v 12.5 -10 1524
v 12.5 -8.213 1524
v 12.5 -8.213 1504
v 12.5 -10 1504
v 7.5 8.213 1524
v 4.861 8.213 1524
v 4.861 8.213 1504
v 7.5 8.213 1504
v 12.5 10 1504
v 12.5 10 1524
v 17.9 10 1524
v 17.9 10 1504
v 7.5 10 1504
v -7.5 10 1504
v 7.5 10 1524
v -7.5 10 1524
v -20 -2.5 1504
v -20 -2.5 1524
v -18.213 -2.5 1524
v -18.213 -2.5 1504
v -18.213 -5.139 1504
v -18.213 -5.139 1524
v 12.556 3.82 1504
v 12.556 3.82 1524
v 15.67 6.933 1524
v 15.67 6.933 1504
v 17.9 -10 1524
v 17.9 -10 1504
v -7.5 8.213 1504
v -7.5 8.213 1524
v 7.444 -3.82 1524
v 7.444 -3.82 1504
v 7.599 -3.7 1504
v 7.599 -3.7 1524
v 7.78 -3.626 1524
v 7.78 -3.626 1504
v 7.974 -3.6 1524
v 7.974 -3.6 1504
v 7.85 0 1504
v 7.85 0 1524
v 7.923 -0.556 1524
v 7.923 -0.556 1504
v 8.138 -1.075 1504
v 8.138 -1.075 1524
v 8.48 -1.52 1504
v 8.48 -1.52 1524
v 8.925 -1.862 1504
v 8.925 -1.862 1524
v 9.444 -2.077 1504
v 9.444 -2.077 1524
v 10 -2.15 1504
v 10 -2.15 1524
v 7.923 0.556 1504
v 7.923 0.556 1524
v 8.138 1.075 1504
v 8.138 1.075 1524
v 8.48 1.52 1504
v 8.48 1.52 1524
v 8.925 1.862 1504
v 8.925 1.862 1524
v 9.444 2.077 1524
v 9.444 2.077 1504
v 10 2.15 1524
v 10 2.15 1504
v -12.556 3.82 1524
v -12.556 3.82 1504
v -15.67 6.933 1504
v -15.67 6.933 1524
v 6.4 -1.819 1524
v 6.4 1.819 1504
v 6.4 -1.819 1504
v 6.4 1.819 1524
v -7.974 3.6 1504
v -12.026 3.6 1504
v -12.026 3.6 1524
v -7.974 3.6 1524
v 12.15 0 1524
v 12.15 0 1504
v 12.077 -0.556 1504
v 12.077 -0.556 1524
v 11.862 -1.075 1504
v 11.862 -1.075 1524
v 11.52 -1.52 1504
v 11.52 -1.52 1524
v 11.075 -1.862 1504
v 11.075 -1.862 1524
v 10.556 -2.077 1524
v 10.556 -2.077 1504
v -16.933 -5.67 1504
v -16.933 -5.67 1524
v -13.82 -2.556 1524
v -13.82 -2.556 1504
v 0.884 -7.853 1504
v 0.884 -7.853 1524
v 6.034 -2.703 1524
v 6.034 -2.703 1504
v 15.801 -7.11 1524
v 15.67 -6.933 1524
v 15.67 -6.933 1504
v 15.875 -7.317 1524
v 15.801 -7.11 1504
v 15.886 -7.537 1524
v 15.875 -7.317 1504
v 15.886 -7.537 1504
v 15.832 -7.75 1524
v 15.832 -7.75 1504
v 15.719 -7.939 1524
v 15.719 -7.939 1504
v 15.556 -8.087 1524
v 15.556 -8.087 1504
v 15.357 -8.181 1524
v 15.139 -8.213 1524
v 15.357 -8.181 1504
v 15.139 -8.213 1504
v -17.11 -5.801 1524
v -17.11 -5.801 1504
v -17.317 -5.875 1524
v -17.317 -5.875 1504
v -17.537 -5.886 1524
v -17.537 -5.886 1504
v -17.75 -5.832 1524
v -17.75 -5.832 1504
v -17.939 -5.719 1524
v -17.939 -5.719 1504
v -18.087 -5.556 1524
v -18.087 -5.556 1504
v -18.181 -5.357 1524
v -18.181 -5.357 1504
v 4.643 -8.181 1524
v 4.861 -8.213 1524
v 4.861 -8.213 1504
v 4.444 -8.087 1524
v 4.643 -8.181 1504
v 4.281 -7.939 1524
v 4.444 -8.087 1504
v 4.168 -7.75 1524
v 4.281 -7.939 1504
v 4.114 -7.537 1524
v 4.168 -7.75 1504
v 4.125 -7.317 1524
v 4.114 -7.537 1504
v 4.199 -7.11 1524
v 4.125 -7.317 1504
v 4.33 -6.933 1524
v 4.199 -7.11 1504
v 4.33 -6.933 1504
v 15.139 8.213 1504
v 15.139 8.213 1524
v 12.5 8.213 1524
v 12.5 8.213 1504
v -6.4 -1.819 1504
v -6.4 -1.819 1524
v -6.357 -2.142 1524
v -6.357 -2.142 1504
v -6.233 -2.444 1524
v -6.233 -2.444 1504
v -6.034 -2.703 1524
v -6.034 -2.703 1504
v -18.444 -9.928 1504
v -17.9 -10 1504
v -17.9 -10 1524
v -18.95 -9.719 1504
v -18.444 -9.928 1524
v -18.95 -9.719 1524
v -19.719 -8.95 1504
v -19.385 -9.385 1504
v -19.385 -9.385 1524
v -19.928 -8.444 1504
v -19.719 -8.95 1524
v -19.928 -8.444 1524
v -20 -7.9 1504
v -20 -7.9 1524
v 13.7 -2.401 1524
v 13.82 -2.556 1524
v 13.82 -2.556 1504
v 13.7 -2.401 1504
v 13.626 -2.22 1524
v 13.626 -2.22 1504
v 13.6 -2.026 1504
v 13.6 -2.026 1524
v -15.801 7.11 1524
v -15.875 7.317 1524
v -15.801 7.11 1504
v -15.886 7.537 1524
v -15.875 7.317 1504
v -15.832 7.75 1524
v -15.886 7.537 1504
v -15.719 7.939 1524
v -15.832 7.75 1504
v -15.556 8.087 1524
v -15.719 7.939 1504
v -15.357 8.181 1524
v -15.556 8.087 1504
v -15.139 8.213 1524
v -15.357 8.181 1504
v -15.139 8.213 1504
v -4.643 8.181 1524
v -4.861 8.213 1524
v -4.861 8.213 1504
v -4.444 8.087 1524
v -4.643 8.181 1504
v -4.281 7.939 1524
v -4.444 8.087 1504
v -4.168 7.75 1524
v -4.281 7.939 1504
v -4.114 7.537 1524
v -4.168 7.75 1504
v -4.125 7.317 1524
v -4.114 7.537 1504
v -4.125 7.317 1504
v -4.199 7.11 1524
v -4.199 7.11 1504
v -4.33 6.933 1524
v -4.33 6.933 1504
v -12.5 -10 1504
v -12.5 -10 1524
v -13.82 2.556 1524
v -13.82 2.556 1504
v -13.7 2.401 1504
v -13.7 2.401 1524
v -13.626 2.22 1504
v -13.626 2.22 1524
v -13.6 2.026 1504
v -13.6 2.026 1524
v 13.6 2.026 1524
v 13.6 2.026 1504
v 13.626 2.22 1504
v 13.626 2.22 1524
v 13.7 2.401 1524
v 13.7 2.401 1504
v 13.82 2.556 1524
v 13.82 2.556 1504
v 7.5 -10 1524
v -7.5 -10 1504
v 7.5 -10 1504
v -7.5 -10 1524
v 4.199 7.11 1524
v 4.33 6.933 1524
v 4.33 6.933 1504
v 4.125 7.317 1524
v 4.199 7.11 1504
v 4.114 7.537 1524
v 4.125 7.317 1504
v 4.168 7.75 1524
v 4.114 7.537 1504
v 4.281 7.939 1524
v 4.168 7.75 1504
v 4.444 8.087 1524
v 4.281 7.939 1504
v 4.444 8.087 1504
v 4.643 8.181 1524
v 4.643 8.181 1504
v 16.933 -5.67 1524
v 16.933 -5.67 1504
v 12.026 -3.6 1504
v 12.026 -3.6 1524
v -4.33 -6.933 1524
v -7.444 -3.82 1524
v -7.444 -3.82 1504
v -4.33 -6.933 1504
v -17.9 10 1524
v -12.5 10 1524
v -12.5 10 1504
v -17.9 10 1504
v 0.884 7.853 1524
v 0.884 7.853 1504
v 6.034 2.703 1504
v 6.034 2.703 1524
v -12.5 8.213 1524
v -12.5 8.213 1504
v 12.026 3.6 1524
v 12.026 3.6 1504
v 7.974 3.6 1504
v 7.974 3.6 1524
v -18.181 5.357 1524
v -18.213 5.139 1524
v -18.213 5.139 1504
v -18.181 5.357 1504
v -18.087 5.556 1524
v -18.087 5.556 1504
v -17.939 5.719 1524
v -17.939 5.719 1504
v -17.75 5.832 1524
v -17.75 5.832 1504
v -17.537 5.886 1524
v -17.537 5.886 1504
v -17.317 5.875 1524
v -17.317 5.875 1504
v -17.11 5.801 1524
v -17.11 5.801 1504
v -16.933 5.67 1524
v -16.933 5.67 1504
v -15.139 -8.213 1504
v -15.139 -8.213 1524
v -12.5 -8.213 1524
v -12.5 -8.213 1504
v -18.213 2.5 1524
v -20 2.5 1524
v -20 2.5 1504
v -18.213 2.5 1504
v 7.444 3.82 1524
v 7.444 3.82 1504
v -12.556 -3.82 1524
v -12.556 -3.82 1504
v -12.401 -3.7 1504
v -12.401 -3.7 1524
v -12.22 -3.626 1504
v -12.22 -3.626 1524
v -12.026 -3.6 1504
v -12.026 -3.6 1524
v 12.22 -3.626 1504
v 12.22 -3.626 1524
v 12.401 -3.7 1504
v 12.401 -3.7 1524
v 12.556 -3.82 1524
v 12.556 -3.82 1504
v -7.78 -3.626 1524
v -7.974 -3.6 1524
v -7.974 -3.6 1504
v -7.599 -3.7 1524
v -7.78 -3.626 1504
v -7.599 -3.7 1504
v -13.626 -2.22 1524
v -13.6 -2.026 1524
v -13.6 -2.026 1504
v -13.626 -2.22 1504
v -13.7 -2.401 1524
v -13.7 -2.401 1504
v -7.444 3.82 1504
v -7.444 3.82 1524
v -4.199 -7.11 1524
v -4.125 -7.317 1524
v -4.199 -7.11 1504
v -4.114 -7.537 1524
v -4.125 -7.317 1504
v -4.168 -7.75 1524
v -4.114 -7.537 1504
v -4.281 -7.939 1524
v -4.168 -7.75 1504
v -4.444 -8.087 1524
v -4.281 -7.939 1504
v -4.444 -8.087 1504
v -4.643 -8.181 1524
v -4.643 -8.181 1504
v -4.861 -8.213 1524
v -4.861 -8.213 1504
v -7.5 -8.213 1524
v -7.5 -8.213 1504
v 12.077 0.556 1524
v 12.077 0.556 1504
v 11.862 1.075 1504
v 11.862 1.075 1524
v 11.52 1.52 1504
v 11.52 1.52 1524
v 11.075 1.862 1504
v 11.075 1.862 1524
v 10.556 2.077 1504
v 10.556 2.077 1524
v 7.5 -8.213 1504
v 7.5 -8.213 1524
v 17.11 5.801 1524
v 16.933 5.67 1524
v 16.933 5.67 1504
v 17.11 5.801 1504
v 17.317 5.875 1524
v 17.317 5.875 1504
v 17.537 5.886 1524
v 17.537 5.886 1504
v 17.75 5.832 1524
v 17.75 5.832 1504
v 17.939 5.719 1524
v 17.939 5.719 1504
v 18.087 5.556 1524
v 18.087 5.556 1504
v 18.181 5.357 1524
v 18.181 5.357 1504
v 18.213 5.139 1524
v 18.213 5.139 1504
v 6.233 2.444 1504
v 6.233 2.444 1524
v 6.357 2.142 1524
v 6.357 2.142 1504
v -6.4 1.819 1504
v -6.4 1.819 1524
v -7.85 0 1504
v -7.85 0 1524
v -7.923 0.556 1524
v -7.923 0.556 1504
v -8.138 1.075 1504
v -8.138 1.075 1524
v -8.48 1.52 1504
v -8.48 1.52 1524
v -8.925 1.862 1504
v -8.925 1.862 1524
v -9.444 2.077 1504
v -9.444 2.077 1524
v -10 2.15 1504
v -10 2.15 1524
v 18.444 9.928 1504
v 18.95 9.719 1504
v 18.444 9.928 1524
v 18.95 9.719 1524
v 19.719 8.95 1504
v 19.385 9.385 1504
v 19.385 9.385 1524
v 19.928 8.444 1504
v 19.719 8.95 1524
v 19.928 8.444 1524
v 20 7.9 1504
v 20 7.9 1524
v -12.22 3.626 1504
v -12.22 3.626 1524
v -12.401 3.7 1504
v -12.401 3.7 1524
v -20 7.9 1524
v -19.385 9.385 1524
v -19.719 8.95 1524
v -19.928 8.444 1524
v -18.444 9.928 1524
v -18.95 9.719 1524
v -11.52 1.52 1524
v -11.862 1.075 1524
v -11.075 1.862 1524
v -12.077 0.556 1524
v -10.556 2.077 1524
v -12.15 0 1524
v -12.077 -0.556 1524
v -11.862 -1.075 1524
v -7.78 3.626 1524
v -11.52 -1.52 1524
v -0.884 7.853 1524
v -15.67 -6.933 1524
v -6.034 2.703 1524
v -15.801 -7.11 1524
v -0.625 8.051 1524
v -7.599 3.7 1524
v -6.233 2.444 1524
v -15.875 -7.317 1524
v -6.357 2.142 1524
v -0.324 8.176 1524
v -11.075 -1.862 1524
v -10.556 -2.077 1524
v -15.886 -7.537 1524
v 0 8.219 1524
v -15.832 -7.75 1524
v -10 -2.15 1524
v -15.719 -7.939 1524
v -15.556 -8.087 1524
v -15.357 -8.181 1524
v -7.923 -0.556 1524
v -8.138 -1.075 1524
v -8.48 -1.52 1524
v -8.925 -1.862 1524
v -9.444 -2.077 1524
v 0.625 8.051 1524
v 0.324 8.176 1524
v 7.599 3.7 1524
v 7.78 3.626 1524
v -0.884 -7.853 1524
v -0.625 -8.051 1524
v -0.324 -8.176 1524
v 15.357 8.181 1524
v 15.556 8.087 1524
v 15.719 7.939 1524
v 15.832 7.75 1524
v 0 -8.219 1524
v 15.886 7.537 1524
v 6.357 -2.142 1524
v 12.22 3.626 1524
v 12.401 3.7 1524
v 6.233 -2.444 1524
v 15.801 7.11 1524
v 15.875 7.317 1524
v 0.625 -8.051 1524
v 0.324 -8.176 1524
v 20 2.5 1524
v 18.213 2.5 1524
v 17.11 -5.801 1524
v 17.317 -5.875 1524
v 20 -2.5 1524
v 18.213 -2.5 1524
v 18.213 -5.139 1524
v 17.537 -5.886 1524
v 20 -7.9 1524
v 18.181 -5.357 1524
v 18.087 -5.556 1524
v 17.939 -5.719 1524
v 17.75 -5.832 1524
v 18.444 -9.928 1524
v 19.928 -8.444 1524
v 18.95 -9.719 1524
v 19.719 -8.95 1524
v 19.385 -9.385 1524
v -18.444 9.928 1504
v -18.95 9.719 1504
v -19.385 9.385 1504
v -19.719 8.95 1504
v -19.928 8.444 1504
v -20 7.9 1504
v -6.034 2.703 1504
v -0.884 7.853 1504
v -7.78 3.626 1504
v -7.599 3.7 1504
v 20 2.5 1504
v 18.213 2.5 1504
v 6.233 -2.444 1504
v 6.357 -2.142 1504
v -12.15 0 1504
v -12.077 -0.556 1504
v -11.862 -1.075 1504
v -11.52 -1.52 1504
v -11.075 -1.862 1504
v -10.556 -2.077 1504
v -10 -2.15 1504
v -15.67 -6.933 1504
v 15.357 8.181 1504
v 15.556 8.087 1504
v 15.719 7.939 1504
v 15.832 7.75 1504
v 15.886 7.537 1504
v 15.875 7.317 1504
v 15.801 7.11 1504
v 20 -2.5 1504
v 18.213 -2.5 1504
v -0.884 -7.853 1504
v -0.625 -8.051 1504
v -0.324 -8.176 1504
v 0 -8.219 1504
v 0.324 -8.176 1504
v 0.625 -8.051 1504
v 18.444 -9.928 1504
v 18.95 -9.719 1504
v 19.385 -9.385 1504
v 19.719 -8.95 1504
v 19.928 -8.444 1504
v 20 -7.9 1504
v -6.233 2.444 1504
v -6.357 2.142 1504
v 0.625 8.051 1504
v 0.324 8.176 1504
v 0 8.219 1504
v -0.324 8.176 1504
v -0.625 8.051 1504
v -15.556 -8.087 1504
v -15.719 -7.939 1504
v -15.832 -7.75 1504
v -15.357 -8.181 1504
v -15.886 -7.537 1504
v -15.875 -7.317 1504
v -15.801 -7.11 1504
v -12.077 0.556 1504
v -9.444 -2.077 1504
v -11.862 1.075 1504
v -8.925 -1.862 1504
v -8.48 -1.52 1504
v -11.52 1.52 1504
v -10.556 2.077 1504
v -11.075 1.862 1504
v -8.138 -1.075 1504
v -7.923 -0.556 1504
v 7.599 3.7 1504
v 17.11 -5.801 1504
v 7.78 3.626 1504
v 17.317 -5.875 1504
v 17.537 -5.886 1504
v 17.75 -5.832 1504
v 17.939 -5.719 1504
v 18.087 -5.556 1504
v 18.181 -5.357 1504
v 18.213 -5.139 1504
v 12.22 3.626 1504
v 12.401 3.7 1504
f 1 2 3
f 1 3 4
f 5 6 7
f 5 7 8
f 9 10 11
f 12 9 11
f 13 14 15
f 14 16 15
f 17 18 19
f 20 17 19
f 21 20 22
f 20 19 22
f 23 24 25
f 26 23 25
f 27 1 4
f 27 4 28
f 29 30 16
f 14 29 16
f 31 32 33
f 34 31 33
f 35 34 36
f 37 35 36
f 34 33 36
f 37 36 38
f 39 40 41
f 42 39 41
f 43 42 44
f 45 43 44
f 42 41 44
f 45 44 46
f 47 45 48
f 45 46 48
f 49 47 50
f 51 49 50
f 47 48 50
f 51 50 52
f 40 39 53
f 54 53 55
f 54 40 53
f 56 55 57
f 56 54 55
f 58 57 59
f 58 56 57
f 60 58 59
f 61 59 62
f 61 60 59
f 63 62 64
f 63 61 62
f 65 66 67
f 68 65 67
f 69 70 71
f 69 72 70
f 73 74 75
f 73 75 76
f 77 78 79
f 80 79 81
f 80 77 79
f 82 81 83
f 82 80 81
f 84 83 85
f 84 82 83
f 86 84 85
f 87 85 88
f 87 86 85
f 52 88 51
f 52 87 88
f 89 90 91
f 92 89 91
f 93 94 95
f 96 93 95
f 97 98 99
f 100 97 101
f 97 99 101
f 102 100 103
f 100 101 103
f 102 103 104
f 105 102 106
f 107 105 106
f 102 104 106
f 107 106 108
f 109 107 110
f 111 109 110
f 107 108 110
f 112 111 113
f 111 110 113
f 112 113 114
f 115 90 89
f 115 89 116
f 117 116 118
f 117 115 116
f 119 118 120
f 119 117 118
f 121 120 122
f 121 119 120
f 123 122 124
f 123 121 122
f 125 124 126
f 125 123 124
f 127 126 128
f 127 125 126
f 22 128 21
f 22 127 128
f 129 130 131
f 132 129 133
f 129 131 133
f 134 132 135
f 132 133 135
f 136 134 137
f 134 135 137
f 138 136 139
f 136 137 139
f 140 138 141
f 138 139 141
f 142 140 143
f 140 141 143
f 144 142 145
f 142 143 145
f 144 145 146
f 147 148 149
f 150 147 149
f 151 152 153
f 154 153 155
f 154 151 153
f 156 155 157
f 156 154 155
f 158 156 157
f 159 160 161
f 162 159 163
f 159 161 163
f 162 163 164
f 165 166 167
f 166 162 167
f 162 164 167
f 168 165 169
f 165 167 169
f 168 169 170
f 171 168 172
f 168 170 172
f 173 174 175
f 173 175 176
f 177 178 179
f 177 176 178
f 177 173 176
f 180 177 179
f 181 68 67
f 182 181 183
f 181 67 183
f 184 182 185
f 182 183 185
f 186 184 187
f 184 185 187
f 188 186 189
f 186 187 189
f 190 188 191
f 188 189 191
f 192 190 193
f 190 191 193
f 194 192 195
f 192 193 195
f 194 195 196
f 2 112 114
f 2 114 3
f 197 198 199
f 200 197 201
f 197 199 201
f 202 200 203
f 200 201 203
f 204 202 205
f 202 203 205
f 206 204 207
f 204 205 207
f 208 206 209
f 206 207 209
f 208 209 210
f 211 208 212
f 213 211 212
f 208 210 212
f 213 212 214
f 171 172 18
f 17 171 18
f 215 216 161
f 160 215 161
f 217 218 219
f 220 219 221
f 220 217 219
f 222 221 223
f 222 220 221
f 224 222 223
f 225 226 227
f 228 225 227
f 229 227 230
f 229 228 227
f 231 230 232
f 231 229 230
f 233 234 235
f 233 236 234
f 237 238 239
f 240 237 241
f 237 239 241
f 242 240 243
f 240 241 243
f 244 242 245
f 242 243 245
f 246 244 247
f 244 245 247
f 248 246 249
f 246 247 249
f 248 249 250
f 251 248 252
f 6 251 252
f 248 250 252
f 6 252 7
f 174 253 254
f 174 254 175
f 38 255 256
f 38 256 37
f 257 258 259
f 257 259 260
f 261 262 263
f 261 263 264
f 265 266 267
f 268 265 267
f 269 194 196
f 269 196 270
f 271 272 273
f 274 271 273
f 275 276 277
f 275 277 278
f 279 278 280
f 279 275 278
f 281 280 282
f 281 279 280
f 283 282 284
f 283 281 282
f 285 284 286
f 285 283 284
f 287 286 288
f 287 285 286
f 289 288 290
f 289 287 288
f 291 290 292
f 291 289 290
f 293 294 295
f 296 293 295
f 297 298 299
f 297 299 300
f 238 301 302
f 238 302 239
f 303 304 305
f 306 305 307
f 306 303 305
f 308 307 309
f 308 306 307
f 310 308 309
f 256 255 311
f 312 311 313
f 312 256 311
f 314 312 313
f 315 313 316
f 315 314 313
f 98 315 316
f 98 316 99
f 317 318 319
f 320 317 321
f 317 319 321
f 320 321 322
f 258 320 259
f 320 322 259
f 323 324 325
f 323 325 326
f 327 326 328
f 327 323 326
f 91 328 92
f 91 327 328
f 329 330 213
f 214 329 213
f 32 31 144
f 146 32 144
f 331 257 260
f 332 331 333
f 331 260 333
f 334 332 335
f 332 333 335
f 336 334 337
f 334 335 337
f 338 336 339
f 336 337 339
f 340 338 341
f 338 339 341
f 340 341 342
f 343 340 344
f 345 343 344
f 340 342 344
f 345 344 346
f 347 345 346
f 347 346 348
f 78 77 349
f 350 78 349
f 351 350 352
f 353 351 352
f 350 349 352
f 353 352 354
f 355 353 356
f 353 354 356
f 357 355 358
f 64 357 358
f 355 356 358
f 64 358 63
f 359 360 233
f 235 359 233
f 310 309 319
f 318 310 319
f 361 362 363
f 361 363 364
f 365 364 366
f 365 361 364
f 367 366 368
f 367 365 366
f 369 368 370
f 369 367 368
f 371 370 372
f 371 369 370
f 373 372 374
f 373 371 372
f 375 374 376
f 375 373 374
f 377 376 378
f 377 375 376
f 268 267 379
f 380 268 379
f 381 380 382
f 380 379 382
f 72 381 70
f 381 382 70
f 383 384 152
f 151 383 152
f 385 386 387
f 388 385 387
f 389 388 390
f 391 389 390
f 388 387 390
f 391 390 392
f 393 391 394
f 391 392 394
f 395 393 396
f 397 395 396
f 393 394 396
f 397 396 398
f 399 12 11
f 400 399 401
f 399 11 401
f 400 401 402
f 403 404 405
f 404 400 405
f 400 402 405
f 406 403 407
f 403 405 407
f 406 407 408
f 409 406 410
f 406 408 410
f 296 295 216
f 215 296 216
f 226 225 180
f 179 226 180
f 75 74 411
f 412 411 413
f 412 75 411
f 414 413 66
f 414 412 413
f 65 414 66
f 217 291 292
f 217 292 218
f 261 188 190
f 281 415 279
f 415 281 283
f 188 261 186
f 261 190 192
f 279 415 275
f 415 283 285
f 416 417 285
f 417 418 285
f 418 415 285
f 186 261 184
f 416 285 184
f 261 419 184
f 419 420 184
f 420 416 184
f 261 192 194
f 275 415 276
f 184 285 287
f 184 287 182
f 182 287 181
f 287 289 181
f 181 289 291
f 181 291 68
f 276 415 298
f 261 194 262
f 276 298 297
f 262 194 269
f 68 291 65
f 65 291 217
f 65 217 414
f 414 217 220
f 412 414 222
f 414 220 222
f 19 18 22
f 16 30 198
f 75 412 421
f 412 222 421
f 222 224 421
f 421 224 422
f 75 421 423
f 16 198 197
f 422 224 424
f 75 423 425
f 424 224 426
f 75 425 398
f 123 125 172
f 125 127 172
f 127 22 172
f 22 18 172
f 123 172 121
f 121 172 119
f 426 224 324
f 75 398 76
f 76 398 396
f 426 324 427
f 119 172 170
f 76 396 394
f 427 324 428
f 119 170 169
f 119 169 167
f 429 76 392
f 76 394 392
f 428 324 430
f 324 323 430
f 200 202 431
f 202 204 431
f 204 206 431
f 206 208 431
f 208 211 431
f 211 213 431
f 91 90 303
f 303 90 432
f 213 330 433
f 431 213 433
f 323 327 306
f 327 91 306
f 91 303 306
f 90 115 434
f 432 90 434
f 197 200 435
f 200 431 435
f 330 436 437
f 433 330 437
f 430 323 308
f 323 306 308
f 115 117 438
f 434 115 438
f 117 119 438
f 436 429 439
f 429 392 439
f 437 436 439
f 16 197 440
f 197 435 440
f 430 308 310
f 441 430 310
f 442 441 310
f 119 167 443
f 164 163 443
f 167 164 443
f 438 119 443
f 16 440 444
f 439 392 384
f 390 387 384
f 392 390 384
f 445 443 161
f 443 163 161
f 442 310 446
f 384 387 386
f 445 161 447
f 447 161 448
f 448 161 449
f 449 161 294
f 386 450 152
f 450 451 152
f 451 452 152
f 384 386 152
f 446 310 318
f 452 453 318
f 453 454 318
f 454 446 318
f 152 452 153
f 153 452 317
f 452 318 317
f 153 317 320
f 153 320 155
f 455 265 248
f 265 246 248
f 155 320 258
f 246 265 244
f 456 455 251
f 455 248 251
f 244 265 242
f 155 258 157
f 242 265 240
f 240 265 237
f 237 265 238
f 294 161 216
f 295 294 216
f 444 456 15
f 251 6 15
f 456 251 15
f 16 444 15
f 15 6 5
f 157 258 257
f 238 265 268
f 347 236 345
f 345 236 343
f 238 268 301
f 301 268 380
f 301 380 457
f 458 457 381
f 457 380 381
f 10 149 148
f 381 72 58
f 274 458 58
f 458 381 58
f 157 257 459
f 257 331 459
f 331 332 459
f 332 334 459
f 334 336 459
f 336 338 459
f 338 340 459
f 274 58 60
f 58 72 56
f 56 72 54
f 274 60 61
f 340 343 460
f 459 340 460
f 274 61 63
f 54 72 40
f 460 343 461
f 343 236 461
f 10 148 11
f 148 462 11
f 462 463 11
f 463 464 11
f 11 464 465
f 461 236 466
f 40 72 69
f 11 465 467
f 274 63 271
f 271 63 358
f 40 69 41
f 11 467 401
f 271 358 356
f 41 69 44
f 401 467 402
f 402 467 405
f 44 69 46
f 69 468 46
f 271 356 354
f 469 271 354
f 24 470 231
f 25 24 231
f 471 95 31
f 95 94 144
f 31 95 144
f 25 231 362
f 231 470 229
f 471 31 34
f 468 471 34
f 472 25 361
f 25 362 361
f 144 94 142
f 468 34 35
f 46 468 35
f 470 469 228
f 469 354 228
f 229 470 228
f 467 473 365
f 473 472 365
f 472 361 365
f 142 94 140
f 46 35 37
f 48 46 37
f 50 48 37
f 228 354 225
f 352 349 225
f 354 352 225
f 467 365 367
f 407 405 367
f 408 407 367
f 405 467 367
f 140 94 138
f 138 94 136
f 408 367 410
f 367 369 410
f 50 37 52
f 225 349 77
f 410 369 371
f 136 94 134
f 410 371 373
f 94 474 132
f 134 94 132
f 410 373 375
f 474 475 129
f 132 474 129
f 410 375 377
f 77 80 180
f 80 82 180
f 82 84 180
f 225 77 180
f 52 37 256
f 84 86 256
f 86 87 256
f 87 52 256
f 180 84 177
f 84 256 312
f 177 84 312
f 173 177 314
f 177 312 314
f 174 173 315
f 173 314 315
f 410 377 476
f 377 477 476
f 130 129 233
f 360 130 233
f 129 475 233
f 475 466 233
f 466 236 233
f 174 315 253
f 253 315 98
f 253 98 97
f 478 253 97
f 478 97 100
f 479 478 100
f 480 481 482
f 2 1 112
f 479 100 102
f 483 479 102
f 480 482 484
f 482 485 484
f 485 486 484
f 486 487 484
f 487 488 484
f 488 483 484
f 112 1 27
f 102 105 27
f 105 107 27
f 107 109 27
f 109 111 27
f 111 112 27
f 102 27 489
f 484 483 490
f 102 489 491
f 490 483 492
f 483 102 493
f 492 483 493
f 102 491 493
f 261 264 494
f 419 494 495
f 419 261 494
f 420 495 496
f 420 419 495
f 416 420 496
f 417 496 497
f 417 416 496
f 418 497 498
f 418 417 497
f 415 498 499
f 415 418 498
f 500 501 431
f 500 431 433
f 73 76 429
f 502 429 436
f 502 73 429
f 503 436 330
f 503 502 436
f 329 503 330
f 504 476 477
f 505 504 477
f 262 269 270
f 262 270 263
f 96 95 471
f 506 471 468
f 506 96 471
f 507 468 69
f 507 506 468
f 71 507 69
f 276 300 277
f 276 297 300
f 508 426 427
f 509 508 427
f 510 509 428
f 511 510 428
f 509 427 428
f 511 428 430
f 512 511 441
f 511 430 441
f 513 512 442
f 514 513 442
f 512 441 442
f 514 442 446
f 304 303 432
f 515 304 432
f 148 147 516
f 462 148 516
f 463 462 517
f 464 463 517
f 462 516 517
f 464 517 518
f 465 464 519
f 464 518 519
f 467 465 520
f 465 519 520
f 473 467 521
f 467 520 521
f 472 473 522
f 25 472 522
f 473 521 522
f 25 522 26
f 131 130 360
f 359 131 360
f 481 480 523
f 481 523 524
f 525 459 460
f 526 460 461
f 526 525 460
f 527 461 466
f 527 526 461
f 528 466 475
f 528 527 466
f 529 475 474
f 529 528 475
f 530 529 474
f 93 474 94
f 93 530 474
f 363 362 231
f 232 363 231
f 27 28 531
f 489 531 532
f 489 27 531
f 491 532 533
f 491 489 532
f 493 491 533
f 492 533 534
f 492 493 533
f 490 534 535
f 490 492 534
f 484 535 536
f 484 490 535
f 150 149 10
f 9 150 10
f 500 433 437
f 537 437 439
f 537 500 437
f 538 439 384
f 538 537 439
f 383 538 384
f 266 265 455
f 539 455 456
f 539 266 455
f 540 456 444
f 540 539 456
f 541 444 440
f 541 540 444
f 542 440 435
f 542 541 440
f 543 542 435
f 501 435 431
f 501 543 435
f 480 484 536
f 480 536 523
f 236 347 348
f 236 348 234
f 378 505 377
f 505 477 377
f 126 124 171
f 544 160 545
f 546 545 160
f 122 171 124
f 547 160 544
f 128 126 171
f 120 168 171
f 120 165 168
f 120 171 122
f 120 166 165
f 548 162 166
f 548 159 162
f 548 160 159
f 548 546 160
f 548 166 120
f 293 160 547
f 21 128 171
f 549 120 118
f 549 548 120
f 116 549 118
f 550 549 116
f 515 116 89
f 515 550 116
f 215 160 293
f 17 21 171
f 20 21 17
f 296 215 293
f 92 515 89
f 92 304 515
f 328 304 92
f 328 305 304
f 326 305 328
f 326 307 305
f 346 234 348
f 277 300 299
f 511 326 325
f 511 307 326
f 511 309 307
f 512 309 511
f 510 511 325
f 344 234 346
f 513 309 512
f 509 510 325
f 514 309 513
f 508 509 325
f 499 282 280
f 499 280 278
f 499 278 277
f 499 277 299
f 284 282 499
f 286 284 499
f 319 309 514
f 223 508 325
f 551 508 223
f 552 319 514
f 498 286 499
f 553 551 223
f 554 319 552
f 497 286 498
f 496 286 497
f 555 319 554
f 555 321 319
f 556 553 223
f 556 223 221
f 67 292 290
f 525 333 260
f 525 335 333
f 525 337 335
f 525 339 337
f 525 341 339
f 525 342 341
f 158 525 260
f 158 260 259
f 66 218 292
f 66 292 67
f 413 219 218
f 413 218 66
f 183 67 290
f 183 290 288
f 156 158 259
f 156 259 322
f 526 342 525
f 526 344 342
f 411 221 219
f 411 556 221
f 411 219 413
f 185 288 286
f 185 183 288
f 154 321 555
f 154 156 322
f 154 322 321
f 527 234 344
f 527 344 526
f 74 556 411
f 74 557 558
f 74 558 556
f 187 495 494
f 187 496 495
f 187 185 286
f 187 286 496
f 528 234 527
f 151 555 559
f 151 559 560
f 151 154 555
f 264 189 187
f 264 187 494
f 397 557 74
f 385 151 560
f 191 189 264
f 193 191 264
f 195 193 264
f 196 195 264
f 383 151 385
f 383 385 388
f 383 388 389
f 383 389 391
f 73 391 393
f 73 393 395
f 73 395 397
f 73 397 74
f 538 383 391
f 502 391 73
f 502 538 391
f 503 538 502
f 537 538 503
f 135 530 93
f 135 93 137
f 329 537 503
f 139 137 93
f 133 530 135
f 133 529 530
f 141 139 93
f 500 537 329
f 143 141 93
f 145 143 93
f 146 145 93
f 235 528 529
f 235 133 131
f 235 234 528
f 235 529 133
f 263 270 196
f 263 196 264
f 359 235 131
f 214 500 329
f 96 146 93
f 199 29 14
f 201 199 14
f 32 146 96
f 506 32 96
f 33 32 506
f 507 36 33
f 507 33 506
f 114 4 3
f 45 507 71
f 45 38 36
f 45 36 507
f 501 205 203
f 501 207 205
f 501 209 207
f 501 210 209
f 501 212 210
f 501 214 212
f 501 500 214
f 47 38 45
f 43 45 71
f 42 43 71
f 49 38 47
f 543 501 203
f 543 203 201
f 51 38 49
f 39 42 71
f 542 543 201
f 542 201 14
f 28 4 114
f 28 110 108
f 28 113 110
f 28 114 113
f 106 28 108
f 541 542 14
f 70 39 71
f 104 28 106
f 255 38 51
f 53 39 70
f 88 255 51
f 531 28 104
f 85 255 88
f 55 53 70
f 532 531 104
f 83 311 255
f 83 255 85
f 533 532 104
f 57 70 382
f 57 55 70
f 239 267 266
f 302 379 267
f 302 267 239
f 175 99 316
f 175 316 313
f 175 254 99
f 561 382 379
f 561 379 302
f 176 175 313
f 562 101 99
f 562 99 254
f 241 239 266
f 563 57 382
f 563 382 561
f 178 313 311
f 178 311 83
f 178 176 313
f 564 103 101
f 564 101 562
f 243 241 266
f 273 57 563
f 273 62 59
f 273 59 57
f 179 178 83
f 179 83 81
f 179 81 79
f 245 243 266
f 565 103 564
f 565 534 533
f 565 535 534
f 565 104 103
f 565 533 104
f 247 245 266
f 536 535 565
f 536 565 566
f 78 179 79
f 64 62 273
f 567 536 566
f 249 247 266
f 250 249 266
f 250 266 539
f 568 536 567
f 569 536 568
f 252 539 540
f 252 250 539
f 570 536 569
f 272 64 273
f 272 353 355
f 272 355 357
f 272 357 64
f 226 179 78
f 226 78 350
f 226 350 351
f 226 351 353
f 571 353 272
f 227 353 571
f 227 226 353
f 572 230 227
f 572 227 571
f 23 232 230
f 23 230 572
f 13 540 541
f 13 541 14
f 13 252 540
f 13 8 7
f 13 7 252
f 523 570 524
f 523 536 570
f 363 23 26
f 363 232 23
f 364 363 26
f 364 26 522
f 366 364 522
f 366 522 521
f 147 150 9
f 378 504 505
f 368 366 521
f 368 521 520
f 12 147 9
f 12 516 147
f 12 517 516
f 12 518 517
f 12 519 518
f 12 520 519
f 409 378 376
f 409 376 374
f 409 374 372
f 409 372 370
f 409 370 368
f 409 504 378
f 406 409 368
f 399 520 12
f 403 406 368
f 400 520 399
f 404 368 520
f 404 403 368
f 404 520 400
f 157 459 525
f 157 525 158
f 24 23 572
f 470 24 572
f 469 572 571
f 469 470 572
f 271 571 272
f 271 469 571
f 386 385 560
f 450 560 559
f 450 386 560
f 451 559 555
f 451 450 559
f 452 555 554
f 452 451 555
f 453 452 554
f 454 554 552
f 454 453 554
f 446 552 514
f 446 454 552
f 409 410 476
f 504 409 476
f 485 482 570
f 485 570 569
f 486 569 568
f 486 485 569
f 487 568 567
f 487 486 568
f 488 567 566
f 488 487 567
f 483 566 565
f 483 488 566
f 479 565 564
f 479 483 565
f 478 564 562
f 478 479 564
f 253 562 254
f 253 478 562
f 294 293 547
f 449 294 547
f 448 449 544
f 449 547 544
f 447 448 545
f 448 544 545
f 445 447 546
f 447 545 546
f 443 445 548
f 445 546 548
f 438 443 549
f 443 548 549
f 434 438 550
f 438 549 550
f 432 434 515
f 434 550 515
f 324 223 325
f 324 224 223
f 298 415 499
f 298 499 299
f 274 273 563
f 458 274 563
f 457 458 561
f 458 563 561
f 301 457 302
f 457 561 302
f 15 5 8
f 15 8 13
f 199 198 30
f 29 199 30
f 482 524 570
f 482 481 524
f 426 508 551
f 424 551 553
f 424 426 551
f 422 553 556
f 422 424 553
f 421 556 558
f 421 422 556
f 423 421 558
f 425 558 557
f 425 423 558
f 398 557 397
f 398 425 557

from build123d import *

# Parameters (mm, degrees)
BOSS_EXTRUDE1_DEPTH = 1524
BOSS_EXTRUDE2_DEPTH = 1524
FILLET1_R           = 0.75
FILLET2_R           = 1.25
SKETCH5_W           = 3028
SKETCH5_H           = 20
CUT_EXTRUDE1_DEPTH  = 1525.55764076


with BuildPart() as part:
    # Sketch3 → Boss-Extrude1 (new, symmetric)
    with BuildSketch(Plane.XY):
        with BuildLine():
            Line((12.5, -10), (17.9, -10))
            ThreePointArc((17.9, -10), (19.38492424, -9.38492424), (20, -7.9))
            Line((20, -7.9), (20, -2.5))
            Line((20, -2.5), (18.213351365, -2.5))
            Line((18.213351365, -2.5), (18.213351365, -6.95))
            Line((18.213351365, -6.95), (13.6, -2.336648635))
            Line((13.6, -2.336648635), (13.6, 0))
            Line((13.6, 0), (12.15, 0))
            ThreePointArc((12.15, 0), (11.52027958, -1.52027958), (10, -2.15))
            Line((10, -2.15), (10, -3.6))
            Line((10, -3.6), (12.336648635, -3.6))
            Line((12.336648635, -3.6), (16.95, -8.213351365))
            Line((16.95, -8.213351365), (12.5, -8.213351365))
            Line((12.5, -8.213351365), (12.5, -10))
        make_face()
    extrude(amount=BOSS_EXTRUDE1_DEPTH, both=True)

    # Sketch4 → Boss-Extrude2 (add, symmetric)
    with BuildSketch(Plane.XY):
        with BuildLine():
            Line((10, -3.6), (7.663351365, -3.6))
            Line((7.663351365, -3.6), (3.05, -8.213351365))
            Line((3.05, -8.213351365), (7.5, -8.213351365))
            Line((7.5, -8.213351365), (7.5, -10))
            Line((7.5, -10), (0, -10))
            Line((0, -10), (0, -8.736648635))
            Line((0, -8.736648635), (6.4, -2.336648635))
            Line((6.4, -2.336648635), (6.4, 0))
            Line((6.4, 0), (7.85, 0))
            ThreePointArc((7.85, 0), (8.47972042, -1.52027958), (10, -2.15))
            Line((10, -2.15), (10, -3.6))
        make_face()
    extrude(amount=BOSS_EXTRUDE2_DEPTH, both=True)

    # Mirror1: part across plane


with BuildPart() as part_1:
    add(part.part)
    add(part.part.mirror(Plane(origin=(0, 0, 0), x_dir=(0, 0, 1), z_dir=(1, 0, 0))))

    # Mirror2: part across plane


with BuildPart() as part_2:
    add(part_1.part)
    add(part_1.part.mirror(Plane.ZX))

    # Fillet1
    fillet1_edges = [part_2.edges().sort_by_distance(p)[0] for p in [
        (18.213351365, 6.95, 0),
        (13.6, 2.336648635, 0),
        (12.336648635, 3.6, 0),
        (16.95, 8.213351365, 0),
        (3.05, 8.213351365, 0),
        (7.663351365, 3.6, 0),
        (-18.213351365, 6.95, 0),
        (-13.6, 2.336648635, 0),
        (-7.663351365, 3.6, 0),
        (-12.336648635, 3.6, 0),
        (-16.95, 8.213351365, 0),
        (-3.05, 8.213351365, 0),
        (16.95, -8.213351365, 0),
        (12.336648635, -3.6, 0),
        (13.6, -2.336648635, 0),
        (18.213351365, -6.95, 0),
        (3.05, -8.213351365, 0),
        (7.663351365, -3.6, 0),
        (-18.213351365, -6.95, 0),
        (-13.6, -2.336648635, 0),
        (-12.336648635, -3.6, 0),
        (-16.95, -8.213351365, 0),
        (-3.05, -8.213351365, 0),
        (-7.663351365, -3.6, 0),
    ]]
    fillet(fillet1_edges, radius=FILLET1_R)

    # Fillet2
    fillet2_edges = [part_2.edges().sort_by_distance(p)[0] for p in [
        (6.4, 2.336648635, 0),
        (0, 8.736648635, 0),
        (-6.4, 2.336648635, 0),
        (6.4, -2.336648635, 0),
        (-6.4, -2.336648635, 0),
        (0, -8.736648635, 0),
    ]]
    fillet(fillet2_edges, radius=FILLET2_R)

    # Sketch5 → Cut-Extrude1 (cut, through all)
    with BuildSketch(Plane(origin=(20, 0, 0), x_dir=(0, 0, -1), z_dir=(1, 0, 0))):
        with Locations((10, 0)):
            Rectangle(SKETCH5_W, SKETCH5_H)
    extrude(amount=-CUT_EXTRUDE1_DEPTH, mode=Mode.SUBTRACT)


solid = part_2.part
